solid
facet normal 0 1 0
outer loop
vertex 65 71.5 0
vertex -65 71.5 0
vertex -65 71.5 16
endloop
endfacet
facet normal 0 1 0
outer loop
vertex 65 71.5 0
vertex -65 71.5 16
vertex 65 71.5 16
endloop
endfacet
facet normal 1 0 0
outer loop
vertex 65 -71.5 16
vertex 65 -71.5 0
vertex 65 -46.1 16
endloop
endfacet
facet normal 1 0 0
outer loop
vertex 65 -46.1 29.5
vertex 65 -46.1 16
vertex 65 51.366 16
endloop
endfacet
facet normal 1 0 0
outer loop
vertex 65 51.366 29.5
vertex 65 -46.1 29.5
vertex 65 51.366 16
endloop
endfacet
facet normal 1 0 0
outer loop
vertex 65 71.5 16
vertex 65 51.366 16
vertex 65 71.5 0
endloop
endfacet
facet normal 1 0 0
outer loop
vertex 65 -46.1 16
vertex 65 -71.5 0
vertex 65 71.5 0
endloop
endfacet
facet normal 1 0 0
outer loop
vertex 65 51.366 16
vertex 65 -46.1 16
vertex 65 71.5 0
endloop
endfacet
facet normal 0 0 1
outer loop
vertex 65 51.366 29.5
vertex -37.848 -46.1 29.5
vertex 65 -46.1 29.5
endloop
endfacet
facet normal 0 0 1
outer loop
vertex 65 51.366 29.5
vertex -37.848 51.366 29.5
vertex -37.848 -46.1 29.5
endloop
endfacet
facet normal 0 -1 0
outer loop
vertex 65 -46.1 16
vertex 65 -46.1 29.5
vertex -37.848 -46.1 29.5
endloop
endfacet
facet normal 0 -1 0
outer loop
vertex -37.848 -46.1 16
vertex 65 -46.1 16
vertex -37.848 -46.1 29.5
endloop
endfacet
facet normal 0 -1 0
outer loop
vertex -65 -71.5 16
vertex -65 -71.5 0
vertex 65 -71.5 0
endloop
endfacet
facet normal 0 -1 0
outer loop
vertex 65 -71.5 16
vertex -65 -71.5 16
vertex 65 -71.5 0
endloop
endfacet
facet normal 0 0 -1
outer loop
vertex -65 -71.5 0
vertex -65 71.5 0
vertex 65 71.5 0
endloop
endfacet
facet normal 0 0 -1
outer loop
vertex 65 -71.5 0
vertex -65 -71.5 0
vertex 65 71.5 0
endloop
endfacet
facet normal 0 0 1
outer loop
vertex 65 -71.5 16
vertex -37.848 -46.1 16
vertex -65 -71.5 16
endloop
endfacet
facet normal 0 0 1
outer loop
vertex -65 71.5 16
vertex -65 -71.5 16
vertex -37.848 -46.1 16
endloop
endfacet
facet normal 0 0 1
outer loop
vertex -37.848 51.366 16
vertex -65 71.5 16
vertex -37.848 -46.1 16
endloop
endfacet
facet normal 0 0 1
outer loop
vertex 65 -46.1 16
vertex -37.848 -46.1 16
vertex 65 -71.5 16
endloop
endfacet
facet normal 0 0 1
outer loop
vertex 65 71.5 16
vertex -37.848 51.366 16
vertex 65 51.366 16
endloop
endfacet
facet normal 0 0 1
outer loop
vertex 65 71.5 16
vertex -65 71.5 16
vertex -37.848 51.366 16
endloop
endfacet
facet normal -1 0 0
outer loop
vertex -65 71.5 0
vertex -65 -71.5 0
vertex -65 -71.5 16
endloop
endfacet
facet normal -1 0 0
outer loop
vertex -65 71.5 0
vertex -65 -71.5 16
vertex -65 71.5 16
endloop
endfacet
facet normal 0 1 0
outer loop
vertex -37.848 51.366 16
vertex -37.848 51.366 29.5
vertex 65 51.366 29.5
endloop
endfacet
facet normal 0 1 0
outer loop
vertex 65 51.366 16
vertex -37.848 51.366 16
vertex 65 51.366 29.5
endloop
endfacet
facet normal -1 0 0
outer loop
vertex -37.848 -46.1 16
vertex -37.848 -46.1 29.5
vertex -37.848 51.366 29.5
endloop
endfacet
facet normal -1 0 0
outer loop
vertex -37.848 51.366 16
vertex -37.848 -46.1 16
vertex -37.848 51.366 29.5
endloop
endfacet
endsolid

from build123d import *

# Parameters (mm, degrees)
F0_W     = 130
F0_H     = 143
F1_DEPTH = 29.5
F3_DEPTH = 13.5


with BuildPart() as f1:
    # F0 (on Top) → F1 (new body)
    with BuildSketch(Plane.XY):
        Rectangle(F0_W, F0_H)
    extrude(amount=F1_DEPTH)

    # F2 (on face) → F3 (cut)
    with BuildSketch(Plane.XY.offset(29.5)):
        Polygon((-37.84842, 51.365882), (65, 51.365882), (65, 71.5), (-65, 71.5), (-65, -71.5), (65, -71.5), (65, -46.1), (-37.84842, -46.1), align=None)
    extrude(amount=-F3_DEPTH, mode=Mode.SUBTRACT)


solid = f1.part
